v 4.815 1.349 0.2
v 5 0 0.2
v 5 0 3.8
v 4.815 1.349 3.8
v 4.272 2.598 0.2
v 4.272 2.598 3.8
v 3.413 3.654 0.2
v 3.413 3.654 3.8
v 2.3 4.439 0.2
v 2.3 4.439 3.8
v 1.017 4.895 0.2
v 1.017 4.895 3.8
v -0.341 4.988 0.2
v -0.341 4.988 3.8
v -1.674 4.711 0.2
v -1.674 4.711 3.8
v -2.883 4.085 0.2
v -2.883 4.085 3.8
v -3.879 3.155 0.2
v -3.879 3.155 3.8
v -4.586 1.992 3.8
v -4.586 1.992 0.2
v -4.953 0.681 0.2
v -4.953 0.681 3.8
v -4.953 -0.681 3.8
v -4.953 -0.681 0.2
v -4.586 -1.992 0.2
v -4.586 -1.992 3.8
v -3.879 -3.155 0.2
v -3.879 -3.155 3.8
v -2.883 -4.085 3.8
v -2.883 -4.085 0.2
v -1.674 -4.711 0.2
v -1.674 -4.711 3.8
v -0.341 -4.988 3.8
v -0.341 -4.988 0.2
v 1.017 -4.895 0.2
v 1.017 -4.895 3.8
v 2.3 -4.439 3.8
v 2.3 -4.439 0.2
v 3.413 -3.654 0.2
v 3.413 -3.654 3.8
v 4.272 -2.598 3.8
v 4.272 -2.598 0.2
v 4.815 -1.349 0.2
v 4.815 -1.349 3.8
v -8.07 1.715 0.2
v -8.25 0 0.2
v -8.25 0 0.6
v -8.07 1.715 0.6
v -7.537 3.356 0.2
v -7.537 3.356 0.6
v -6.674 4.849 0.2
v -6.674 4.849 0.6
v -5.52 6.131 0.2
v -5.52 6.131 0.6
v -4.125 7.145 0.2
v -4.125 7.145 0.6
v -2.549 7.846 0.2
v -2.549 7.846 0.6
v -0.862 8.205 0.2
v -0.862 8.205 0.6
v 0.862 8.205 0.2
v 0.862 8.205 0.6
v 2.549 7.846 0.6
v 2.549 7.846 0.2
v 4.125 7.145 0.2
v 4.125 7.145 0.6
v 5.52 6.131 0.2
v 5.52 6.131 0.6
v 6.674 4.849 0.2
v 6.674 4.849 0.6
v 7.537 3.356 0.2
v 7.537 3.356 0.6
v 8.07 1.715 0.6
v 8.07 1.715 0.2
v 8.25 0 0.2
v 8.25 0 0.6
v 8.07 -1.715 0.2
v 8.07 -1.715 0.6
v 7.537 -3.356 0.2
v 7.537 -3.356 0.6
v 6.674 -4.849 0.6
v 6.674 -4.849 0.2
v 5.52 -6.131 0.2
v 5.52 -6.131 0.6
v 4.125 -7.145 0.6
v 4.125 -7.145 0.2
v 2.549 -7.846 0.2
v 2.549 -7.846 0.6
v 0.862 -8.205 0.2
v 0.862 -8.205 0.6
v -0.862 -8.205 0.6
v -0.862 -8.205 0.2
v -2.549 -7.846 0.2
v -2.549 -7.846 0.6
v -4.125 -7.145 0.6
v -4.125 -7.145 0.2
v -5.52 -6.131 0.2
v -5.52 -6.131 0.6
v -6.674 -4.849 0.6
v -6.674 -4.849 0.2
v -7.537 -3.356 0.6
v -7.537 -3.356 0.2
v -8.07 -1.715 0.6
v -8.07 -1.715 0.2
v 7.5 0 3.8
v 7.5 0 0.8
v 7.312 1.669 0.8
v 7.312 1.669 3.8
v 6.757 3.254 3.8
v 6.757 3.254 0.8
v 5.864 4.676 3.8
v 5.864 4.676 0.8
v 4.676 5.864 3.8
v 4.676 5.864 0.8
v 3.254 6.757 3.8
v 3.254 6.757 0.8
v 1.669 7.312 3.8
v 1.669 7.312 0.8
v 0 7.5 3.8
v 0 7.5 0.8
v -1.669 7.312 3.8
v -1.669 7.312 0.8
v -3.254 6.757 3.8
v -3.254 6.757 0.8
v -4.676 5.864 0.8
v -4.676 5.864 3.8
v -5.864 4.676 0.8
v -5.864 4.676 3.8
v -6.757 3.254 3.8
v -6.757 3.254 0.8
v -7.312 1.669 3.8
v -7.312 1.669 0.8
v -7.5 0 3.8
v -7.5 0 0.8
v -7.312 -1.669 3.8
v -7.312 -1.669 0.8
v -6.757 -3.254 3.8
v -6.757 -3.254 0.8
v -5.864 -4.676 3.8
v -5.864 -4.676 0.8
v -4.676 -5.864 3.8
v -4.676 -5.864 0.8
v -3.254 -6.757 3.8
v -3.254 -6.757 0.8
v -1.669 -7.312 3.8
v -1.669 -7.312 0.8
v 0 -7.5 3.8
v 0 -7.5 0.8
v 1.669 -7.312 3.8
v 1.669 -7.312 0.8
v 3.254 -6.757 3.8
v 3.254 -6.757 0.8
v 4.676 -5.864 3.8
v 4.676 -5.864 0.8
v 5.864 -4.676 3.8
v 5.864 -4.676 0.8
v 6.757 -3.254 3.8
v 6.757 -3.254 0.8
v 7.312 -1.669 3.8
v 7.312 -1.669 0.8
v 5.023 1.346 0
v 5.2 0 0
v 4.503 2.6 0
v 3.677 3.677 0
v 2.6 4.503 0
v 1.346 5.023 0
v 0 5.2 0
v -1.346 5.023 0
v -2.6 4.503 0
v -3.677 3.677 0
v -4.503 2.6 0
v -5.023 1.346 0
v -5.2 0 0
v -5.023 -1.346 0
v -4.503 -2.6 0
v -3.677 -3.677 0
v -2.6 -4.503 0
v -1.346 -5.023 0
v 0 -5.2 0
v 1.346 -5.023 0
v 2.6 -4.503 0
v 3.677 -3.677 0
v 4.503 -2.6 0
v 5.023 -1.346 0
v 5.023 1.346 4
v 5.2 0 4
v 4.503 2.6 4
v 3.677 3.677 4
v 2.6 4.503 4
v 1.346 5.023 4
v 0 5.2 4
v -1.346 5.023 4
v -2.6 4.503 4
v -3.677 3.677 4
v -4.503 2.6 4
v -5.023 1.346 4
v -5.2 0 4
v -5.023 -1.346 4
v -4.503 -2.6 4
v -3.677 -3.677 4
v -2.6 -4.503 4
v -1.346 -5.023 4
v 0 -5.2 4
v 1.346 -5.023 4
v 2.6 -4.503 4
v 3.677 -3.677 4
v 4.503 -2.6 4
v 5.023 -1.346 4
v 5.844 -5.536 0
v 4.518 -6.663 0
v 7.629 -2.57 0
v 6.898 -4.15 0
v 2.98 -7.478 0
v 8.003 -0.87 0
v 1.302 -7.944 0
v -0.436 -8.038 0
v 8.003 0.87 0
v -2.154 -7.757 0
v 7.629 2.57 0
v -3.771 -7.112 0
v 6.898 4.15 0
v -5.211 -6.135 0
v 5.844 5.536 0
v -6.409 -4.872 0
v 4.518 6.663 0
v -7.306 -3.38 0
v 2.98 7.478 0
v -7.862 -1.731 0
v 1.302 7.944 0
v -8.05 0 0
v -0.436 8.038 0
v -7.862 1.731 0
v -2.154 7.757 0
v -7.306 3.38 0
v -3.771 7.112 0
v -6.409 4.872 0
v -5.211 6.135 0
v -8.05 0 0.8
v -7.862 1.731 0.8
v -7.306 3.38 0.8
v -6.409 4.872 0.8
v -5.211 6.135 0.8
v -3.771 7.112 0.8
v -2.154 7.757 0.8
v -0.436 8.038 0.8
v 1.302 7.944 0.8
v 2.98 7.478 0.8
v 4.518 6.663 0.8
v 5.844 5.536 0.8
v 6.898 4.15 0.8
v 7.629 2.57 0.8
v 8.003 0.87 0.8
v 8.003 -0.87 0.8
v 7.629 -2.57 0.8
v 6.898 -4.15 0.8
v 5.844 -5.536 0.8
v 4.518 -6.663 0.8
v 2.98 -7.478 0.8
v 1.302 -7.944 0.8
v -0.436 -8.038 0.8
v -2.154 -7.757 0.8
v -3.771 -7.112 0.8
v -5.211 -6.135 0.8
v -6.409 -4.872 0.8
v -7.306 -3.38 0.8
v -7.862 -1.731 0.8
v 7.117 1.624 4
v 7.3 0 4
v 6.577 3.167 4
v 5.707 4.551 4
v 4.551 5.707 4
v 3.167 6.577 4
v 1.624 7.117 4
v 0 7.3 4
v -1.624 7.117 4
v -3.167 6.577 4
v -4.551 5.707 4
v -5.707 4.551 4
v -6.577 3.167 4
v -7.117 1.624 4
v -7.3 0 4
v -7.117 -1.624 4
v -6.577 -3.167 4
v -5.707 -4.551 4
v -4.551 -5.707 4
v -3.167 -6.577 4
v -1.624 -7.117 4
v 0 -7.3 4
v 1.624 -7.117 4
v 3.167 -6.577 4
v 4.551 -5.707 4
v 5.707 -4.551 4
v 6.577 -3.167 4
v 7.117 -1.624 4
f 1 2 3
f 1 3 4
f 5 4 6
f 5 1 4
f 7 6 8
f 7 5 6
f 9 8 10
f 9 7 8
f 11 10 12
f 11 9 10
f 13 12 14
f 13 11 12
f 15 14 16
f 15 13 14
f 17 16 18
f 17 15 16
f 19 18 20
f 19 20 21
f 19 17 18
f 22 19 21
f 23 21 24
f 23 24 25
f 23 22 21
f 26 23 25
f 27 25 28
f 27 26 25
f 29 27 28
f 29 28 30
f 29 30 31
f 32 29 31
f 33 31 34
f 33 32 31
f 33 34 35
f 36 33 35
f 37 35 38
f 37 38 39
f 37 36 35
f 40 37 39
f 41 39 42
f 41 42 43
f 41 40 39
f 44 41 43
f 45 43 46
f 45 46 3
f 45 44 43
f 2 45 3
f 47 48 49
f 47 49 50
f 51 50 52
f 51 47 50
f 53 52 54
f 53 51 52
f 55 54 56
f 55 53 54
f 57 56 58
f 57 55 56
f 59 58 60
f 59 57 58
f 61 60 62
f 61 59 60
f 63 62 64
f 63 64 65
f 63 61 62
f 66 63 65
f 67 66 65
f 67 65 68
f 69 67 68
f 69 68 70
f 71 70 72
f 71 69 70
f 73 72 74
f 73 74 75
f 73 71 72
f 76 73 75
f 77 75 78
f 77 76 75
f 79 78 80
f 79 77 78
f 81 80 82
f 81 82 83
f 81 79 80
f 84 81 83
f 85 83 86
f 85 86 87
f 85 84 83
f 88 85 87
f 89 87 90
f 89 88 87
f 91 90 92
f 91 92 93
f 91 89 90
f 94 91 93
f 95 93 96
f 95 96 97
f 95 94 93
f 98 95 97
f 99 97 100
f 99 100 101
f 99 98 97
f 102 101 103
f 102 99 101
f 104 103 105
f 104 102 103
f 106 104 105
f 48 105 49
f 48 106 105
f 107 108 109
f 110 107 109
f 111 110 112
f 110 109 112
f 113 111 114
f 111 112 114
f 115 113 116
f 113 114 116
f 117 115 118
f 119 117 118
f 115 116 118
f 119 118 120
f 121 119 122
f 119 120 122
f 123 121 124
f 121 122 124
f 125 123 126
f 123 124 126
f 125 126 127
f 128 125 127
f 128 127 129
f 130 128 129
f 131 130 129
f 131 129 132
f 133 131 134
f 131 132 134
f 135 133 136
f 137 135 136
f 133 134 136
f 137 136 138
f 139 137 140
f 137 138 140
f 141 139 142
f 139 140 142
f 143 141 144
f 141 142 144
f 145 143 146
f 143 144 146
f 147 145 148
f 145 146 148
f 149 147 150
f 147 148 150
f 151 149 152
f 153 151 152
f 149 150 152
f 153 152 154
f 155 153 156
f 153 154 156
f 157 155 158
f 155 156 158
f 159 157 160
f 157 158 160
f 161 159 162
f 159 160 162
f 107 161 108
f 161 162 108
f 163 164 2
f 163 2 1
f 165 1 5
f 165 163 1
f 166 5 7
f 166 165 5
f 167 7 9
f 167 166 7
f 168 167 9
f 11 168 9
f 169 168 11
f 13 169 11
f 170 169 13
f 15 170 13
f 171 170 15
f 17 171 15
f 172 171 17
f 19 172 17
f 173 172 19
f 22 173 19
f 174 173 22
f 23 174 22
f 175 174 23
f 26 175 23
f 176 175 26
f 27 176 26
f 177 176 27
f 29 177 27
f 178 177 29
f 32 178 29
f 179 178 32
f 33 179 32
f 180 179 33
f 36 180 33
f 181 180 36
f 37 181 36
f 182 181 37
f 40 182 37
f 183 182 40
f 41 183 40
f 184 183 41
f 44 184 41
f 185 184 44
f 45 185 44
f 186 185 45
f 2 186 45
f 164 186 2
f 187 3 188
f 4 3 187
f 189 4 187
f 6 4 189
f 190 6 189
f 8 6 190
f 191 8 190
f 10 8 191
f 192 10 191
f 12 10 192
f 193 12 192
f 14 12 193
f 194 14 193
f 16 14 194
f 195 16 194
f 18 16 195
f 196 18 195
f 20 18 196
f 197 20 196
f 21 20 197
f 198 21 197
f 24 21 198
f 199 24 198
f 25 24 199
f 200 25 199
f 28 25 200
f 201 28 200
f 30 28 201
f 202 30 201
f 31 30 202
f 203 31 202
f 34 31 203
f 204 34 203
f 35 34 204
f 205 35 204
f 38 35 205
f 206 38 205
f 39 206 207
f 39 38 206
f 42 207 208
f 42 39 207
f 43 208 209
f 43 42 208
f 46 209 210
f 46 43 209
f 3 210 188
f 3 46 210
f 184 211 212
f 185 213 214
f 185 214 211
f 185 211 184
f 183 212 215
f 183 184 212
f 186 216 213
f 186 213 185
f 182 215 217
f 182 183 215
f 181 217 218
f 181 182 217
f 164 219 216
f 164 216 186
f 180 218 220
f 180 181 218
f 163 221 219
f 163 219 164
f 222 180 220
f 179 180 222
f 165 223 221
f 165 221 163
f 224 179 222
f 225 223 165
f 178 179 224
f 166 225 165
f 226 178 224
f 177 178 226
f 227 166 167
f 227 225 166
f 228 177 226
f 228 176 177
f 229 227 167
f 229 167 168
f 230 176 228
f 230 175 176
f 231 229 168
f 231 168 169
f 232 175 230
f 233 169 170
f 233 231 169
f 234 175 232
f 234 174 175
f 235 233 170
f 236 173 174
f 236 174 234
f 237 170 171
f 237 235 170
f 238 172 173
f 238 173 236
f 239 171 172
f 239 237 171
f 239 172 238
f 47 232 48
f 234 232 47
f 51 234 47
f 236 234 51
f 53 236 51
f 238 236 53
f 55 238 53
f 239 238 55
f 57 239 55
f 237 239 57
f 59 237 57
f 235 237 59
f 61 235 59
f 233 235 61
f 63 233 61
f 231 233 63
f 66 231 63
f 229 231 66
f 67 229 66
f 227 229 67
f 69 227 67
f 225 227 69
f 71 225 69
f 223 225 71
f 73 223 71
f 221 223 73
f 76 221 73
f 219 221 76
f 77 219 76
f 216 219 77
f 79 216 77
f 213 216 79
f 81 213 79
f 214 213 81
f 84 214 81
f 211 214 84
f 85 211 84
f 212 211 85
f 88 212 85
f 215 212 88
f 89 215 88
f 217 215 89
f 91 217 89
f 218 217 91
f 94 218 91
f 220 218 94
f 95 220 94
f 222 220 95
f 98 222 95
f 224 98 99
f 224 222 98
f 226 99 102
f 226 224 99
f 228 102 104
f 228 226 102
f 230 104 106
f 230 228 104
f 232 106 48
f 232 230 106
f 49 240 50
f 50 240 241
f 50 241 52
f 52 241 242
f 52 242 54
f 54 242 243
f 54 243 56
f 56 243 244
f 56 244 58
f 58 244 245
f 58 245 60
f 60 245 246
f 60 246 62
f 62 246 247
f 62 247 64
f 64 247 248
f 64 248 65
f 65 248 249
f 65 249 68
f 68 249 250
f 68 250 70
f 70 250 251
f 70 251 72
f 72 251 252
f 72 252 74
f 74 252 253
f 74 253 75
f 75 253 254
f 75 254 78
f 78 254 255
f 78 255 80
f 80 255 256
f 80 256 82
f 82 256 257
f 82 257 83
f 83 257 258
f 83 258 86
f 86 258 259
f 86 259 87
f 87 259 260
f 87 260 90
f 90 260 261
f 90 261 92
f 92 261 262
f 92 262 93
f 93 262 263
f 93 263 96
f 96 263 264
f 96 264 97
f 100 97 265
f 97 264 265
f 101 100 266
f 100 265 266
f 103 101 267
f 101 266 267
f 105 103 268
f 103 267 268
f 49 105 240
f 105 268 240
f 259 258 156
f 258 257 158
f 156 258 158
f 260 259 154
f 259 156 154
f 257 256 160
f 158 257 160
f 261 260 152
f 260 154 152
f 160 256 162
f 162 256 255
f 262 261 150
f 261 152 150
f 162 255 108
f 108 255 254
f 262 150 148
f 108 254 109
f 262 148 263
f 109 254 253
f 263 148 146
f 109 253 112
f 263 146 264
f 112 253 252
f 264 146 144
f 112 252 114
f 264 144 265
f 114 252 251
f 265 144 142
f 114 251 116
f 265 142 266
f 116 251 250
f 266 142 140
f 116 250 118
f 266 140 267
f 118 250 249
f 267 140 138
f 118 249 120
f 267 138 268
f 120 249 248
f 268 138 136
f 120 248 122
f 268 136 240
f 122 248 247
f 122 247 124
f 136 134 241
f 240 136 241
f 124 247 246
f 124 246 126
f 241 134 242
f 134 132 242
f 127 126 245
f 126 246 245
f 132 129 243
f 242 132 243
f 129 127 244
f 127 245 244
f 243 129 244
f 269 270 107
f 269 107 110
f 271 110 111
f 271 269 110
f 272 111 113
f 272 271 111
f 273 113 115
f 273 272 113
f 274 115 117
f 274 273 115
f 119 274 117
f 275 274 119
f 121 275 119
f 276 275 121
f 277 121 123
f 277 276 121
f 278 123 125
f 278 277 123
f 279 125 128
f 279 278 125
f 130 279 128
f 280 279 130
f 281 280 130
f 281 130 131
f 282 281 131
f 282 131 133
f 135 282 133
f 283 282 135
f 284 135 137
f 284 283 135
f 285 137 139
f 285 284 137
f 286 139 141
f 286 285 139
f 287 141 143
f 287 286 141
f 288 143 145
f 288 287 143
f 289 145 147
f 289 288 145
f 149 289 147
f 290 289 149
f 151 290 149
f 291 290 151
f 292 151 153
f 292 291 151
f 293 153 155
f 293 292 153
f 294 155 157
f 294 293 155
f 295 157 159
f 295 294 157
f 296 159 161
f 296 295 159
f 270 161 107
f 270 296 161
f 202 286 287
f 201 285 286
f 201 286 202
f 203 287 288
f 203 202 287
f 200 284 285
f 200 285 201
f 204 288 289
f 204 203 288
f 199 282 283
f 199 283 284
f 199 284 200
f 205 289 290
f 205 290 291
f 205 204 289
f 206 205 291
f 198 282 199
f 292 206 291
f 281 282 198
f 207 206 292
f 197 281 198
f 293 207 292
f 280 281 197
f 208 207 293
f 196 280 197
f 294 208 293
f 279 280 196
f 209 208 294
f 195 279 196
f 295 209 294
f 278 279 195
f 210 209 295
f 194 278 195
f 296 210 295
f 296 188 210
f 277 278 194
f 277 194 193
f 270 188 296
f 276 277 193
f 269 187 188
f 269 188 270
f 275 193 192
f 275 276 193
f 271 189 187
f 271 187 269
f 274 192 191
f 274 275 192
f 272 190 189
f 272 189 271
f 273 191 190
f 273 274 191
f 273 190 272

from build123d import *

# Parameters (mm, degrees)
SKETCH_1_R      = 7.5
SKETCH_1_R_2    = 5
EXTRUDE_1_DEPTH = 4
SKETCH_2_R      = 8.25
SKETCH_2_R_2    = 7.5
EXTRUDE_2_DEPTH = 0.8
CHAMFER_1_SIZE  = 0.2


with BuildPart() as part:
    # 草图1 → 凸台-拉伸1 (new body)
    with BuildSketch(Plane.XY):
        Circle(SKETCH_1_R)
        Circle(SKETCH_1_R_2, mode=Mode.SUBTRACT)
    extrude(amount=EXTRUDE_1_DEPTH)

    # 草图2 → 凸台-拉伸2 (add)
    with BuildSketch(Plane(origin=(0, 0, 0), x_dir=(-1, 0, 0), z_dir=(0, 0, -1))):
        Circle(SKETCH_2_R)
        Circle(SKETCH_2_R_2, mode=Mode.SUBTRACT)
    extrude(amount=-EXTRUDE_2_DEPTH)

    # 倒角1
    chamfer_1_edges = [part.edges().sort_by_distance(p)[0] for p in [
        (8.25, 0, 0.8),
        (8.25, 0, 0),
        (-7.5, 0, 4),
        (-5, 0, 0),
        (-5, 0, 4),
    ]]
    chamfer(chamfer_1_edges, length=CHAMFER_1_SIZE)


solid = part.part
